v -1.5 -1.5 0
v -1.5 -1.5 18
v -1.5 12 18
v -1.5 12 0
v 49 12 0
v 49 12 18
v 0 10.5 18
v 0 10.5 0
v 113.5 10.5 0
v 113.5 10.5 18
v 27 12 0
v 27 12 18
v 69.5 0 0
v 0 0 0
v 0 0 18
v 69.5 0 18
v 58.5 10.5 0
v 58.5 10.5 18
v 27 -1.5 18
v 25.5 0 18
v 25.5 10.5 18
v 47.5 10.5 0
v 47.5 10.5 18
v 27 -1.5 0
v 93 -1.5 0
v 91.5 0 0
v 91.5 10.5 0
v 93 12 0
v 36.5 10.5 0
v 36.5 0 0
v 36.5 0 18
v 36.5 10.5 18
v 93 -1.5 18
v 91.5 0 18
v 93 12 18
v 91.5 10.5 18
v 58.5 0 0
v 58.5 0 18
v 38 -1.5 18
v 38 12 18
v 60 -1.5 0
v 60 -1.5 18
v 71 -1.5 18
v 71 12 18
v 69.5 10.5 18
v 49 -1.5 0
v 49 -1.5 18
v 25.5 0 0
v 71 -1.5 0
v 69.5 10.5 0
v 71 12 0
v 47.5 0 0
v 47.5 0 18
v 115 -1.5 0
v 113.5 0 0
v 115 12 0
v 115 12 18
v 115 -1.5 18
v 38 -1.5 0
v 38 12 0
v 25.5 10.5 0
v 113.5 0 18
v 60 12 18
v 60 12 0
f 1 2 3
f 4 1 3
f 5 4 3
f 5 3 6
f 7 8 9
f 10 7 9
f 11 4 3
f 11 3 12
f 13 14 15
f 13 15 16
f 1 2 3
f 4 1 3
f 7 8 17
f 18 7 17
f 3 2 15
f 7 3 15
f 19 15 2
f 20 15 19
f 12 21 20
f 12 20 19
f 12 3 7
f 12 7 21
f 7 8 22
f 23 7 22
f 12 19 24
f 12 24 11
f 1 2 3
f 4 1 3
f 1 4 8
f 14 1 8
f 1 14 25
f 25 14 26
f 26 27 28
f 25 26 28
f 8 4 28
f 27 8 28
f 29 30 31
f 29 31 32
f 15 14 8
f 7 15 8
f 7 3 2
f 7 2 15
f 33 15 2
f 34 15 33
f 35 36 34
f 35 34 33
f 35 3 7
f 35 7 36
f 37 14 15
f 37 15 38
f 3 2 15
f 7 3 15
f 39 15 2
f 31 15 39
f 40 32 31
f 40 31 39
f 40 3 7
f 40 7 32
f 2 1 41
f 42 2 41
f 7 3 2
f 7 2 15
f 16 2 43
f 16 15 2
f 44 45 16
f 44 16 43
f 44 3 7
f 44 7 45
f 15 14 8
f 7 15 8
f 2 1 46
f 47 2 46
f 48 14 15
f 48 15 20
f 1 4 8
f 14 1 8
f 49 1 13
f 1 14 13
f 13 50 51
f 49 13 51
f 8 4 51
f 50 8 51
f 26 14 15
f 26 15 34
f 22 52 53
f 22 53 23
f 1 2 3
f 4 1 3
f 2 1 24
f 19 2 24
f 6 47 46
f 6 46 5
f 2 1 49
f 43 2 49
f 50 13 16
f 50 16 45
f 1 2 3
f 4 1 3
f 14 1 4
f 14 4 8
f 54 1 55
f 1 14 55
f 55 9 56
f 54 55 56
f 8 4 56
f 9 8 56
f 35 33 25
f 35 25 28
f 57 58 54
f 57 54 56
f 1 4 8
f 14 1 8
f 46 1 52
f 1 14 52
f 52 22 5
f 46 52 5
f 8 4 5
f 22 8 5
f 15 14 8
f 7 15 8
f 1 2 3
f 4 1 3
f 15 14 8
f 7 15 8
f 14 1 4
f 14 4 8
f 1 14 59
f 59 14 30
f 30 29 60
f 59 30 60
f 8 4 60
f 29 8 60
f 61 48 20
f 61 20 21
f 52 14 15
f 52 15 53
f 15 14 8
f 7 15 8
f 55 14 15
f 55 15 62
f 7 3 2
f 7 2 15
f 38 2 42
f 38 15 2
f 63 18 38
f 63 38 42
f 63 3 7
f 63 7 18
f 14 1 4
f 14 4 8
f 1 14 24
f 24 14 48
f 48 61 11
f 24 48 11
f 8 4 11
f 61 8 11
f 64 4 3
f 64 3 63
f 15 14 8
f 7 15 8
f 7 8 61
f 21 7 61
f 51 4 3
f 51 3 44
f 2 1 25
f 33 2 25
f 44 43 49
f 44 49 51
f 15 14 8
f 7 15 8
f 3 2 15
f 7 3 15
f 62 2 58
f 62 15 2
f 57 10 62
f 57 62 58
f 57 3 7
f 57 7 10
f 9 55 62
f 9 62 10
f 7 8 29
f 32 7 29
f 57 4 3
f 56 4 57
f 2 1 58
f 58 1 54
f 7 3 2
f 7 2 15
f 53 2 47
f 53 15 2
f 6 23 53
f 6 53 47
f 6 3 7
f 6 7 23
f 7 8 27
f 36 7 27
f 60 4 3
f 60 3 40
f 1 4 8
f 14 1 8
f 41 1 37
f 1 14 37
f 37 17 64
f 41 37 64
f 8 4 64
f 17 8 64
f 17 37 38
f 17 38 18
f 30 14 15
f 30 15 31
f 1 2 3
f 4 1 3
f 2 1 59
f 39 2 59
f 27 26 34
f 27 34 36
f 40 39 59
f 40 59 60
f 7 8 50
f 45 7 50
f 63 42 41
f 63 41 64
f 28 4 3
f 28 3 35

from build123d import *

# Parameters (mm, degrees)
SKETCH_W         = 72.5
SKETCH_H         = 13.5
SKETCH_W_2       = 69.5
SKETCH_H_2       = 10.5
EXTRUDE_DEPTH    = 18
SKETCH001_W      = 28.5
SKETCH001_H      = 13.5
SKETCH001_W_2    = 25.5
SKETCH001_H_2    = 10.5
EXTRUDE001_DEPTH = 18
SKETCH002_W      = 39.5
SKETCH002_H      = 13.5
SKETCH002_W_2    = 36.5
SKETCH002_H_2    = 10.5
EXTRUDE002_DEPTH = 18
SKETCH003_W      = 50.5
SKETCH003_H      = 13.5
SKETCH003_W_2    = 47.5
SKETCH003_H_2    = 10.5
EXTRUDE003_DEPTH = 18
SKETCH004_W      = 61.5
SKETCH004_H      = 13.5
SKETCH004_W_2    = 58.5
SKETCH004_H_2    = 10.5
EXTRUDE004_DEPTH = 18
SKETCH005_W      = 94.5
SKETCH005_H      = 13.5
SKETCH005_W_2    = 91.5
SKETCH005_H_2    = 10.5
EXTRUDE005_DEPTH = 18
SKETCH006_W      = 116.5
SKETCH006_H      = 13.5
SKETCH006_W_2    = 113.5
SKETCH006_H_2    = 10.5
EXTRUDE006_DEPTH = 18


with BuildPart() as f_12c1r:
    # Sketch → Extrude (new body)
    with BuildSketch(Plane.XY):
        with Locations((34.75, 5.25)):
            Rectangle(SKETCH_W, SKETCH_H)
        with Locations((34.75, 5.25)):
            Rectangle(SKETCH_W_2, SKETCH_H_2, mode=Mode.SUBTRACT)
    extrude(amount=EXTRUDE_DEPTH)


with BuildPart() as f_4c1r:
    # Sketch001 → Extrude001 (new body)
    with BuildSketch(Plane.XY):
        with Locations((12.75, 5.25)):
            Rectangle(SKETCH001_W, SKETCH001_H)
        with Locations((12.75, 5.25)):
            Rectangle(SKETCH001_W_2, SKETCH001_H_2, mode=Mode.SUBTRACT)
    extrude(amount=EXTRUDE001_DEPTH)


with BuildPart() as f_6c1r:
    # Sketch002 → Extrude002 (new body)
    with BuildSketch(Plane.XY):
        with Locations((18.25, 5.25)):
            Rectangle(SKETCH002_W, SKETCH002_H)
        with Locations((18.25, 5.25)):
            Rectangle(SKETCH002_W_2, SKETCH002_H_2, mode=Mode.SUBTRACT)
    extrude(amount=EXTRUDE002_DEPTH)


with BuildPart() as f_8c1r:
    # Sketch003 → Extrude003 (new body)
    with BuildSketch(Plane.XY):
        with Locations((23.75, 5.25)):
            Rectangle(SKETCH003_W, SKETCH003_H)
        with Locations((23.75, 5.25)):
            Rectangle(SKETCH003_W_2, SKETCH003_H_2, mode=Mode.SUBTRACT)
    extrude(amount=EXTRUDE003_DEPTH)


with BuildPart() as f_10c1r:
    # Sketch004 → Extrude004 (new body)
    with BuildSketch(Plane.XY):
        with Locations((29.25, 5.25)):
            Rectangle(SKETCH004_W, SKETCH004_H)
        with Locations((29.25, 5.25)):
            Rectangle(SKETCH004_W_2, SKETCH004_H_2, mode=Mode.SUBTRACT)
    extrude(amount=EXTRUDE004_DEPTH)


with BuildPart() as f_16c1r:
    # Sketch005 → Extrude005 (new body)
    with BuildSketch(Plane.XY):
        with Locations((45.75, 5.25)):
            Rectangle(SKETCH005_W, SKETCH005_H)
        with Locations((45.75, 5.25)):
            Rectangle(SKETCH005_W_2, SKETCH005_H_2, mode=Mode.SUBTRACT)
    extrude(amount=EXTRUDE005_DEPTH)


with BuildPart() as f_20c1r:
    # Sketch006 → Extrude006 (new body)
    with BuildSketch(Plane.XY):
        with Locations((56.75, 5.25)):
            Rectangle(SKETCH006_W, SKETCH006_H)
        with Locations((56.75, 5.25)):
            Rectangle(SKETCH006_W_2, SKETCH006_H_2, mode=Mode.SUBTRACT)
    extrude(amount=EXTRUDE006_DEPTH)


solid = Compound([f_12c1r.part, f_4c1r.part, f_6c1r.part, f_8c1r.part, f_10c1r.part, f_16c1r.part, f_20c1r.part])
